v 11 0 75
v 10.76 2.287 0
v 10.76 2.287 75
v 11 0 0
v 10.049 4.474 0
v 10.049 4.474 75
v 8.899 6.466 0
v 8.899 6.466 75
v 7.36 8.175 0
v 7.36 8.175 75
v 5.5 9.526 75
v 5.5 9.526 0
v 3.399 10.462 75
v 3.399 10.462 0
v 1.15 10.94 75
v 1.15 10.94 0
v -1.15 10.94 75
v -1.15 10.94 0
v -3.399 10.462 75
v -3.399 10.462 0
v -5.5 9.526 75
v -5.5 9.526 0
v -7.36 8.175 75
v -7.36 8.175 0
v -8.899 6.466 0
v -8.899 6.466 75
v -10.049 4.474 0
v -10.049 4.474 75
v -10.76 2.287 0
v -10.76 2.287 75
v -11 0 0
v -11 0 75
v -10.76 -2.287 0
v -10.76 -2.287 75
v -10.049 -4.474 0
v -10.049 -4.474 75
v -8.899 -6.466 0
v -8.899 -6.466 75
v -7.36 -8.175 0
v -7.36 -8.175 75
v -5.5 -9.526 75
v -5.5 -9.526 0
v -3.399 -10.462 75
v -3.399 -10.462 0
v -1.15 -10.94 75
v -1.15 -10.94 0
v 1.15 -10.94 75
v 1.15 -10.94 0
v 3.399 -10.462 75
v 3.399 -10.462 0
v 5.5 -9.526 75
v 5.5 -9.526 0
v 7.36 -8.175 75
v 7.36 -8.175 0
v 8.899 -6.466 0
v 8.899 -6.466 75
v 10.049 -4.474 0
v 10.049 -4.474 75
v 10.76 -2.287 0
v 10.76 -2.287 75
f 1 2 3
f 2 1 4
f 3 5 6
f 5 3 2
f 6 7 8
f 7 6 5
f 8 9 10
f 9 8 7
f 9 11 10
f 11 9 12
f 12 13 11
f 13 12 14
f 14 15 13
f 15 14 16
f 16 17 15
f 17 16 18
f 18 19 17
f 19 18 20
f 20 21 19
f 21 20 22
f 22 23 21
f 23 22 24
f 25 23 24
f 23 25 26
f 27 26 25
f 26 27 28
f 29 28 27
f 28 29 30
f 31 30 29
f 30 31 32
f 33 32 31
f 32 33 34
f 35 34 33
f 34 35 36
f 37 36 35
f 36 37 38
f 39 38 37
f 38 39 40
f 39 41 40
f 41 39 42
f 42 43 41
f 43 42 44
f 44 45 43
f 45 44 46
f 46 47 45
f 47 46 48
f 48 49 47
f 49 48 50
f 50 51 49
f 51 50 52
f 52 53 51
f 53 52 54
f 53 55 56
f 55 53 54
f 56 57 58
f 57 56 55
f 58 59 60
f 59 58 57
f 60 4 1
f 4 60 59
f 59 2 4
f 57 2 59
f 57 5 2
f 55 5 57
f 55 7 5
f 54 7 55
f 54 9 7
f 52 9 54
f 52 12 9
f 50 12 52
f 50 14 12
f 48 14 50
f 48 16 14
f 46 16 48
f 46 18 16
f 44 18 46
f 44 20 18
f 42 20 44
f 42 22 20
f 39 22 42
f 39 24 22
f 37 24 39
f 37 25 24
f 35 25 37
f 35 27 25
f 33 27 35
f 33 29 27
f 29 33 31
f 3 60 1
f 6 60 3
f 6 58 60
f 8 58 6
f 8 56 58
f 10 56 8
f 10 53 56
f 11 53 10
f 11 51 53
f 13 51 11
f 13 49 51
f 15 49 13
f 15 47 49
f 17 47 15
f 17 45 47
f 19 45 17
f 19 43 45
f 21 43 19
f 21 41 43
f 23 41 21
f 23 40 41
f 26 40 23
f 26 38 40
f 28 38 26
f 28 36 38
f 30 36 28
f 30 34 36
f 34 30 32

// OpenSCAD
radius = 22 /2;
thickness = 1.5;
number = 50;


height = thickness * number;
cylinder(h = height, r = radius, center = false);
